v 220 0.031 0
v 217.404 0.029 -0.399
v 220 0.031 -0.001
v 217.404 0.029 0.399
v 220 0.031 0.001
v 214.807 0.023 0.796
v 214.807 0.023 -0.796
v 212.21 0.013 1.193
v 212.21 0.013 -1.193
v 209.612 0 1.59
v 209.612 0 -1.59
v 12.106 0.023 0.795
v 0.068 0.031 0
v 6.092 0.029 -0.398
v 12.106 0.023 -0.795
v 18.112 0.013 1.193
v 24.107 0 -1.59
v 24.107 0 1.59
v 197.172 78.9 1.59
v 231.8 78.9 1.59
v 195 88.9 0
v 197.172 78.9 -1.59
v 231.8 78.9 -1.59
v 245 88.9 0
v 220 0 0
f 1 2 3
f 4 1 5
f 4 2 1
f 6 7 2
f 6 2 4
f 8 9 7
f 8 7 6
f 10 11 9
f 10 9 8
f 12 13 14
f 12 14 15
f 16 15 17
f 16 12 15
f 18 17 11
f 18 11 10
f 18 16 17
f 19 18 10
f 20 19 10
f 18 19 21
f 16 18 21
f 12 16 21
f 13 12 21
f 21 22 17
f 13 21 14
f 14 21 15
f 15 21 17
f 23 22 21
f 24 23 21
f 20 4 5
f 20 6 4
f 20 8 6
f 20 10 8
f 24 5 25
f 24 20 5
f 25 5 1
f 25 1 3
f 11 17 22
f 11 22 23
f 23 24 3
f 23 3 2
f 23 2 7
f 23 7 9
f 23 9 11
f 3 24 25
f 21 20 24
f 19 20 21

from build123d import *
from OCP.BRepFilletAPI import BRepFilletAPI_MakeChamfer

# Parameters (mm, degrees)
BOSS_EXTRUDE1_DEPTH = 1.59
CHAMFER1_SIZE       = 1.59
CHAMFER1_SIZE2      = 10
CHAMFER2_SIZE       = 10
CHAMFER2_SIZE_2     = 1.59
SKETCH2_R           = 41
CUT_EXTRUDE1_DEPTH  = 220


with BuildPart() as part:
    # Sketch1 → Boss-Extrude1 (new, symmetric)
    with BuildSketch(Plane.XY):
        Polygon((0, 0), (220, 0), (245, 88.9), (195, 88.9), align=None)
    extrude(amount=BOSS_EXTRUDE1_DEPTH, both=True)

    # Chamfer1: one chamfer whose edges measure the first distance from different faces: ONE call of the kernel's chamfer builder (chamfer() names one face for all edges)
    chamfer1_edges_1 = [part.edges().sort_by_distance(p)[0] for p in [
        (232.5, 44.45, 1.59),
    ]]
    chamfer1_side_1 = [part.faces().sort_by_distance(p)[0] for p in [
        (232.5, 44.45, 0),
    ]]
    chamfer1_edges_2 = [part.edges().sort_by_distance(p)[0] for p in [
        (220, 88.9, 1.59),
    ]]
    chamfer1_side_2 = [part.faces().sort_by_distance(p)[0] for p in [
        (220, 88.9, 0),
    ]]
    chamfer1_edges_3 = [part.edges().sort_by_distance(p)[0] for p in [
        (97.5, 44.45, 1.59),
    ]]
    chamfer1_side_3 = [part.faces().sort_by_distance(p)[0] for p in [
        (97.5, 44.45, 0),
    ]]
    chamfer1 = BRepFilletAPI_MakeChamfer(part.part.solid().wrapped)
    for e in chamfer1_edges_1:
        chamfer1.Add(CHAMFER1_SIZE, CHAMFER1_SIZE2, e.wrapped, chamfer1_side_1[0].wrapped)  # the first distance lies on this face
    for e in chamfer1_edges_2:
        chamfer1.Add(CHAMFER1_SIZE, CHAMFER1_SIZE2, e.wrapped, chamfer1_side_2[0].wrapped)  # the first distance lies on this face
    for e in chamfer1_edges_3:
        chamfer1.Add(CHAMFER1_SIZE, CHAMFER1_SIZE2, e.wrapped, chamfer1_side_3[0].wrapped)  # the first distance lies on this face
    add(Compound.cast(chamfer1.Shape()), mode=Mode.REPLACE)

    # Chamfer2
    # the kernel refuses this chamfer: 10, 1.59 mm, written as the material it takes off along each edge
    with BuildSketch(Plane(origin=(218.64660826, 99.680428074, -1.59), x_dir=(0.41481463774773214, -0.9098858758246093, -0.006042291378384615), z_dir=(-0.9099024859208529, -0.41482221024801963, 0))) as chamfer2_piece_1:
        Polygon((CHAMFER2_SIZE * 0.999981745191, CHAMFER2_SIZE * 0.00604229137838), (-CHAMFER2_SIZE_2 * 0.00604229137839, CHAMFER2_SIZE_2 * 0.999981745191), (0, 0), align=None)
    extrude(amount=266.284816527, mode=Mode.SUBTRACT)
    with BuildSketch(Plane(origin=(270.98806864, 88.9, -1.59), x_dir=(0, -0.9999817451908304, -0.006042291378384616), z_dir=(-1, 0, 0))) as chamfer2_piece_2:
        Polygon((CHAMFER2_SIZE * 0.999981745191, CHAMFER2_SIZE * 0.00604229137838), (-CHAMFER2_SIZE_2 * 0.00604229137838, CHAMFER2_SIZE_2 * 0.999981745191), (0, 0), align=None)
    extrude(amount=101.976137281, mode=Mode.SUBTRACT)
    with BuildSketch(Plane(origin=(212.96466032, -25.017667902, -1.59), x_dir=(0.22378185481817084, -0.06293078032007055, 0.9726054690070615), z_dir=(0.2707142180235852, 0.9626597592918689, 0))) as chamfer2_piece_3:
        Polygon((CHAMFER2_SIZE_2 * 0.972605469007, -CHAMFER2_SIZE_2 * 0.232462043477), (-CHAMFER2_SIZE * 0.232462043477, -CHAMFER2_SIZE * 0.972605469007), (0, 0), align=None)
    extrude(amount=144.324445333, mode=Mode.SUBTRACT)

    # Sketch2 → Cut-Extrude1 (cut)
    with BuildSketch(Plane(origin=(0, 0, 0), x_dir=(0, 0, -1), z_dir=(1, 0, 0))):
        with Locations((0, -40.969157912)):
            Circle(SKETCH2_R)
    extrude(amount=CUT_EXTRUDE1_DEPTH, mode=Mode.SUBTRACT)


solid = part.part
